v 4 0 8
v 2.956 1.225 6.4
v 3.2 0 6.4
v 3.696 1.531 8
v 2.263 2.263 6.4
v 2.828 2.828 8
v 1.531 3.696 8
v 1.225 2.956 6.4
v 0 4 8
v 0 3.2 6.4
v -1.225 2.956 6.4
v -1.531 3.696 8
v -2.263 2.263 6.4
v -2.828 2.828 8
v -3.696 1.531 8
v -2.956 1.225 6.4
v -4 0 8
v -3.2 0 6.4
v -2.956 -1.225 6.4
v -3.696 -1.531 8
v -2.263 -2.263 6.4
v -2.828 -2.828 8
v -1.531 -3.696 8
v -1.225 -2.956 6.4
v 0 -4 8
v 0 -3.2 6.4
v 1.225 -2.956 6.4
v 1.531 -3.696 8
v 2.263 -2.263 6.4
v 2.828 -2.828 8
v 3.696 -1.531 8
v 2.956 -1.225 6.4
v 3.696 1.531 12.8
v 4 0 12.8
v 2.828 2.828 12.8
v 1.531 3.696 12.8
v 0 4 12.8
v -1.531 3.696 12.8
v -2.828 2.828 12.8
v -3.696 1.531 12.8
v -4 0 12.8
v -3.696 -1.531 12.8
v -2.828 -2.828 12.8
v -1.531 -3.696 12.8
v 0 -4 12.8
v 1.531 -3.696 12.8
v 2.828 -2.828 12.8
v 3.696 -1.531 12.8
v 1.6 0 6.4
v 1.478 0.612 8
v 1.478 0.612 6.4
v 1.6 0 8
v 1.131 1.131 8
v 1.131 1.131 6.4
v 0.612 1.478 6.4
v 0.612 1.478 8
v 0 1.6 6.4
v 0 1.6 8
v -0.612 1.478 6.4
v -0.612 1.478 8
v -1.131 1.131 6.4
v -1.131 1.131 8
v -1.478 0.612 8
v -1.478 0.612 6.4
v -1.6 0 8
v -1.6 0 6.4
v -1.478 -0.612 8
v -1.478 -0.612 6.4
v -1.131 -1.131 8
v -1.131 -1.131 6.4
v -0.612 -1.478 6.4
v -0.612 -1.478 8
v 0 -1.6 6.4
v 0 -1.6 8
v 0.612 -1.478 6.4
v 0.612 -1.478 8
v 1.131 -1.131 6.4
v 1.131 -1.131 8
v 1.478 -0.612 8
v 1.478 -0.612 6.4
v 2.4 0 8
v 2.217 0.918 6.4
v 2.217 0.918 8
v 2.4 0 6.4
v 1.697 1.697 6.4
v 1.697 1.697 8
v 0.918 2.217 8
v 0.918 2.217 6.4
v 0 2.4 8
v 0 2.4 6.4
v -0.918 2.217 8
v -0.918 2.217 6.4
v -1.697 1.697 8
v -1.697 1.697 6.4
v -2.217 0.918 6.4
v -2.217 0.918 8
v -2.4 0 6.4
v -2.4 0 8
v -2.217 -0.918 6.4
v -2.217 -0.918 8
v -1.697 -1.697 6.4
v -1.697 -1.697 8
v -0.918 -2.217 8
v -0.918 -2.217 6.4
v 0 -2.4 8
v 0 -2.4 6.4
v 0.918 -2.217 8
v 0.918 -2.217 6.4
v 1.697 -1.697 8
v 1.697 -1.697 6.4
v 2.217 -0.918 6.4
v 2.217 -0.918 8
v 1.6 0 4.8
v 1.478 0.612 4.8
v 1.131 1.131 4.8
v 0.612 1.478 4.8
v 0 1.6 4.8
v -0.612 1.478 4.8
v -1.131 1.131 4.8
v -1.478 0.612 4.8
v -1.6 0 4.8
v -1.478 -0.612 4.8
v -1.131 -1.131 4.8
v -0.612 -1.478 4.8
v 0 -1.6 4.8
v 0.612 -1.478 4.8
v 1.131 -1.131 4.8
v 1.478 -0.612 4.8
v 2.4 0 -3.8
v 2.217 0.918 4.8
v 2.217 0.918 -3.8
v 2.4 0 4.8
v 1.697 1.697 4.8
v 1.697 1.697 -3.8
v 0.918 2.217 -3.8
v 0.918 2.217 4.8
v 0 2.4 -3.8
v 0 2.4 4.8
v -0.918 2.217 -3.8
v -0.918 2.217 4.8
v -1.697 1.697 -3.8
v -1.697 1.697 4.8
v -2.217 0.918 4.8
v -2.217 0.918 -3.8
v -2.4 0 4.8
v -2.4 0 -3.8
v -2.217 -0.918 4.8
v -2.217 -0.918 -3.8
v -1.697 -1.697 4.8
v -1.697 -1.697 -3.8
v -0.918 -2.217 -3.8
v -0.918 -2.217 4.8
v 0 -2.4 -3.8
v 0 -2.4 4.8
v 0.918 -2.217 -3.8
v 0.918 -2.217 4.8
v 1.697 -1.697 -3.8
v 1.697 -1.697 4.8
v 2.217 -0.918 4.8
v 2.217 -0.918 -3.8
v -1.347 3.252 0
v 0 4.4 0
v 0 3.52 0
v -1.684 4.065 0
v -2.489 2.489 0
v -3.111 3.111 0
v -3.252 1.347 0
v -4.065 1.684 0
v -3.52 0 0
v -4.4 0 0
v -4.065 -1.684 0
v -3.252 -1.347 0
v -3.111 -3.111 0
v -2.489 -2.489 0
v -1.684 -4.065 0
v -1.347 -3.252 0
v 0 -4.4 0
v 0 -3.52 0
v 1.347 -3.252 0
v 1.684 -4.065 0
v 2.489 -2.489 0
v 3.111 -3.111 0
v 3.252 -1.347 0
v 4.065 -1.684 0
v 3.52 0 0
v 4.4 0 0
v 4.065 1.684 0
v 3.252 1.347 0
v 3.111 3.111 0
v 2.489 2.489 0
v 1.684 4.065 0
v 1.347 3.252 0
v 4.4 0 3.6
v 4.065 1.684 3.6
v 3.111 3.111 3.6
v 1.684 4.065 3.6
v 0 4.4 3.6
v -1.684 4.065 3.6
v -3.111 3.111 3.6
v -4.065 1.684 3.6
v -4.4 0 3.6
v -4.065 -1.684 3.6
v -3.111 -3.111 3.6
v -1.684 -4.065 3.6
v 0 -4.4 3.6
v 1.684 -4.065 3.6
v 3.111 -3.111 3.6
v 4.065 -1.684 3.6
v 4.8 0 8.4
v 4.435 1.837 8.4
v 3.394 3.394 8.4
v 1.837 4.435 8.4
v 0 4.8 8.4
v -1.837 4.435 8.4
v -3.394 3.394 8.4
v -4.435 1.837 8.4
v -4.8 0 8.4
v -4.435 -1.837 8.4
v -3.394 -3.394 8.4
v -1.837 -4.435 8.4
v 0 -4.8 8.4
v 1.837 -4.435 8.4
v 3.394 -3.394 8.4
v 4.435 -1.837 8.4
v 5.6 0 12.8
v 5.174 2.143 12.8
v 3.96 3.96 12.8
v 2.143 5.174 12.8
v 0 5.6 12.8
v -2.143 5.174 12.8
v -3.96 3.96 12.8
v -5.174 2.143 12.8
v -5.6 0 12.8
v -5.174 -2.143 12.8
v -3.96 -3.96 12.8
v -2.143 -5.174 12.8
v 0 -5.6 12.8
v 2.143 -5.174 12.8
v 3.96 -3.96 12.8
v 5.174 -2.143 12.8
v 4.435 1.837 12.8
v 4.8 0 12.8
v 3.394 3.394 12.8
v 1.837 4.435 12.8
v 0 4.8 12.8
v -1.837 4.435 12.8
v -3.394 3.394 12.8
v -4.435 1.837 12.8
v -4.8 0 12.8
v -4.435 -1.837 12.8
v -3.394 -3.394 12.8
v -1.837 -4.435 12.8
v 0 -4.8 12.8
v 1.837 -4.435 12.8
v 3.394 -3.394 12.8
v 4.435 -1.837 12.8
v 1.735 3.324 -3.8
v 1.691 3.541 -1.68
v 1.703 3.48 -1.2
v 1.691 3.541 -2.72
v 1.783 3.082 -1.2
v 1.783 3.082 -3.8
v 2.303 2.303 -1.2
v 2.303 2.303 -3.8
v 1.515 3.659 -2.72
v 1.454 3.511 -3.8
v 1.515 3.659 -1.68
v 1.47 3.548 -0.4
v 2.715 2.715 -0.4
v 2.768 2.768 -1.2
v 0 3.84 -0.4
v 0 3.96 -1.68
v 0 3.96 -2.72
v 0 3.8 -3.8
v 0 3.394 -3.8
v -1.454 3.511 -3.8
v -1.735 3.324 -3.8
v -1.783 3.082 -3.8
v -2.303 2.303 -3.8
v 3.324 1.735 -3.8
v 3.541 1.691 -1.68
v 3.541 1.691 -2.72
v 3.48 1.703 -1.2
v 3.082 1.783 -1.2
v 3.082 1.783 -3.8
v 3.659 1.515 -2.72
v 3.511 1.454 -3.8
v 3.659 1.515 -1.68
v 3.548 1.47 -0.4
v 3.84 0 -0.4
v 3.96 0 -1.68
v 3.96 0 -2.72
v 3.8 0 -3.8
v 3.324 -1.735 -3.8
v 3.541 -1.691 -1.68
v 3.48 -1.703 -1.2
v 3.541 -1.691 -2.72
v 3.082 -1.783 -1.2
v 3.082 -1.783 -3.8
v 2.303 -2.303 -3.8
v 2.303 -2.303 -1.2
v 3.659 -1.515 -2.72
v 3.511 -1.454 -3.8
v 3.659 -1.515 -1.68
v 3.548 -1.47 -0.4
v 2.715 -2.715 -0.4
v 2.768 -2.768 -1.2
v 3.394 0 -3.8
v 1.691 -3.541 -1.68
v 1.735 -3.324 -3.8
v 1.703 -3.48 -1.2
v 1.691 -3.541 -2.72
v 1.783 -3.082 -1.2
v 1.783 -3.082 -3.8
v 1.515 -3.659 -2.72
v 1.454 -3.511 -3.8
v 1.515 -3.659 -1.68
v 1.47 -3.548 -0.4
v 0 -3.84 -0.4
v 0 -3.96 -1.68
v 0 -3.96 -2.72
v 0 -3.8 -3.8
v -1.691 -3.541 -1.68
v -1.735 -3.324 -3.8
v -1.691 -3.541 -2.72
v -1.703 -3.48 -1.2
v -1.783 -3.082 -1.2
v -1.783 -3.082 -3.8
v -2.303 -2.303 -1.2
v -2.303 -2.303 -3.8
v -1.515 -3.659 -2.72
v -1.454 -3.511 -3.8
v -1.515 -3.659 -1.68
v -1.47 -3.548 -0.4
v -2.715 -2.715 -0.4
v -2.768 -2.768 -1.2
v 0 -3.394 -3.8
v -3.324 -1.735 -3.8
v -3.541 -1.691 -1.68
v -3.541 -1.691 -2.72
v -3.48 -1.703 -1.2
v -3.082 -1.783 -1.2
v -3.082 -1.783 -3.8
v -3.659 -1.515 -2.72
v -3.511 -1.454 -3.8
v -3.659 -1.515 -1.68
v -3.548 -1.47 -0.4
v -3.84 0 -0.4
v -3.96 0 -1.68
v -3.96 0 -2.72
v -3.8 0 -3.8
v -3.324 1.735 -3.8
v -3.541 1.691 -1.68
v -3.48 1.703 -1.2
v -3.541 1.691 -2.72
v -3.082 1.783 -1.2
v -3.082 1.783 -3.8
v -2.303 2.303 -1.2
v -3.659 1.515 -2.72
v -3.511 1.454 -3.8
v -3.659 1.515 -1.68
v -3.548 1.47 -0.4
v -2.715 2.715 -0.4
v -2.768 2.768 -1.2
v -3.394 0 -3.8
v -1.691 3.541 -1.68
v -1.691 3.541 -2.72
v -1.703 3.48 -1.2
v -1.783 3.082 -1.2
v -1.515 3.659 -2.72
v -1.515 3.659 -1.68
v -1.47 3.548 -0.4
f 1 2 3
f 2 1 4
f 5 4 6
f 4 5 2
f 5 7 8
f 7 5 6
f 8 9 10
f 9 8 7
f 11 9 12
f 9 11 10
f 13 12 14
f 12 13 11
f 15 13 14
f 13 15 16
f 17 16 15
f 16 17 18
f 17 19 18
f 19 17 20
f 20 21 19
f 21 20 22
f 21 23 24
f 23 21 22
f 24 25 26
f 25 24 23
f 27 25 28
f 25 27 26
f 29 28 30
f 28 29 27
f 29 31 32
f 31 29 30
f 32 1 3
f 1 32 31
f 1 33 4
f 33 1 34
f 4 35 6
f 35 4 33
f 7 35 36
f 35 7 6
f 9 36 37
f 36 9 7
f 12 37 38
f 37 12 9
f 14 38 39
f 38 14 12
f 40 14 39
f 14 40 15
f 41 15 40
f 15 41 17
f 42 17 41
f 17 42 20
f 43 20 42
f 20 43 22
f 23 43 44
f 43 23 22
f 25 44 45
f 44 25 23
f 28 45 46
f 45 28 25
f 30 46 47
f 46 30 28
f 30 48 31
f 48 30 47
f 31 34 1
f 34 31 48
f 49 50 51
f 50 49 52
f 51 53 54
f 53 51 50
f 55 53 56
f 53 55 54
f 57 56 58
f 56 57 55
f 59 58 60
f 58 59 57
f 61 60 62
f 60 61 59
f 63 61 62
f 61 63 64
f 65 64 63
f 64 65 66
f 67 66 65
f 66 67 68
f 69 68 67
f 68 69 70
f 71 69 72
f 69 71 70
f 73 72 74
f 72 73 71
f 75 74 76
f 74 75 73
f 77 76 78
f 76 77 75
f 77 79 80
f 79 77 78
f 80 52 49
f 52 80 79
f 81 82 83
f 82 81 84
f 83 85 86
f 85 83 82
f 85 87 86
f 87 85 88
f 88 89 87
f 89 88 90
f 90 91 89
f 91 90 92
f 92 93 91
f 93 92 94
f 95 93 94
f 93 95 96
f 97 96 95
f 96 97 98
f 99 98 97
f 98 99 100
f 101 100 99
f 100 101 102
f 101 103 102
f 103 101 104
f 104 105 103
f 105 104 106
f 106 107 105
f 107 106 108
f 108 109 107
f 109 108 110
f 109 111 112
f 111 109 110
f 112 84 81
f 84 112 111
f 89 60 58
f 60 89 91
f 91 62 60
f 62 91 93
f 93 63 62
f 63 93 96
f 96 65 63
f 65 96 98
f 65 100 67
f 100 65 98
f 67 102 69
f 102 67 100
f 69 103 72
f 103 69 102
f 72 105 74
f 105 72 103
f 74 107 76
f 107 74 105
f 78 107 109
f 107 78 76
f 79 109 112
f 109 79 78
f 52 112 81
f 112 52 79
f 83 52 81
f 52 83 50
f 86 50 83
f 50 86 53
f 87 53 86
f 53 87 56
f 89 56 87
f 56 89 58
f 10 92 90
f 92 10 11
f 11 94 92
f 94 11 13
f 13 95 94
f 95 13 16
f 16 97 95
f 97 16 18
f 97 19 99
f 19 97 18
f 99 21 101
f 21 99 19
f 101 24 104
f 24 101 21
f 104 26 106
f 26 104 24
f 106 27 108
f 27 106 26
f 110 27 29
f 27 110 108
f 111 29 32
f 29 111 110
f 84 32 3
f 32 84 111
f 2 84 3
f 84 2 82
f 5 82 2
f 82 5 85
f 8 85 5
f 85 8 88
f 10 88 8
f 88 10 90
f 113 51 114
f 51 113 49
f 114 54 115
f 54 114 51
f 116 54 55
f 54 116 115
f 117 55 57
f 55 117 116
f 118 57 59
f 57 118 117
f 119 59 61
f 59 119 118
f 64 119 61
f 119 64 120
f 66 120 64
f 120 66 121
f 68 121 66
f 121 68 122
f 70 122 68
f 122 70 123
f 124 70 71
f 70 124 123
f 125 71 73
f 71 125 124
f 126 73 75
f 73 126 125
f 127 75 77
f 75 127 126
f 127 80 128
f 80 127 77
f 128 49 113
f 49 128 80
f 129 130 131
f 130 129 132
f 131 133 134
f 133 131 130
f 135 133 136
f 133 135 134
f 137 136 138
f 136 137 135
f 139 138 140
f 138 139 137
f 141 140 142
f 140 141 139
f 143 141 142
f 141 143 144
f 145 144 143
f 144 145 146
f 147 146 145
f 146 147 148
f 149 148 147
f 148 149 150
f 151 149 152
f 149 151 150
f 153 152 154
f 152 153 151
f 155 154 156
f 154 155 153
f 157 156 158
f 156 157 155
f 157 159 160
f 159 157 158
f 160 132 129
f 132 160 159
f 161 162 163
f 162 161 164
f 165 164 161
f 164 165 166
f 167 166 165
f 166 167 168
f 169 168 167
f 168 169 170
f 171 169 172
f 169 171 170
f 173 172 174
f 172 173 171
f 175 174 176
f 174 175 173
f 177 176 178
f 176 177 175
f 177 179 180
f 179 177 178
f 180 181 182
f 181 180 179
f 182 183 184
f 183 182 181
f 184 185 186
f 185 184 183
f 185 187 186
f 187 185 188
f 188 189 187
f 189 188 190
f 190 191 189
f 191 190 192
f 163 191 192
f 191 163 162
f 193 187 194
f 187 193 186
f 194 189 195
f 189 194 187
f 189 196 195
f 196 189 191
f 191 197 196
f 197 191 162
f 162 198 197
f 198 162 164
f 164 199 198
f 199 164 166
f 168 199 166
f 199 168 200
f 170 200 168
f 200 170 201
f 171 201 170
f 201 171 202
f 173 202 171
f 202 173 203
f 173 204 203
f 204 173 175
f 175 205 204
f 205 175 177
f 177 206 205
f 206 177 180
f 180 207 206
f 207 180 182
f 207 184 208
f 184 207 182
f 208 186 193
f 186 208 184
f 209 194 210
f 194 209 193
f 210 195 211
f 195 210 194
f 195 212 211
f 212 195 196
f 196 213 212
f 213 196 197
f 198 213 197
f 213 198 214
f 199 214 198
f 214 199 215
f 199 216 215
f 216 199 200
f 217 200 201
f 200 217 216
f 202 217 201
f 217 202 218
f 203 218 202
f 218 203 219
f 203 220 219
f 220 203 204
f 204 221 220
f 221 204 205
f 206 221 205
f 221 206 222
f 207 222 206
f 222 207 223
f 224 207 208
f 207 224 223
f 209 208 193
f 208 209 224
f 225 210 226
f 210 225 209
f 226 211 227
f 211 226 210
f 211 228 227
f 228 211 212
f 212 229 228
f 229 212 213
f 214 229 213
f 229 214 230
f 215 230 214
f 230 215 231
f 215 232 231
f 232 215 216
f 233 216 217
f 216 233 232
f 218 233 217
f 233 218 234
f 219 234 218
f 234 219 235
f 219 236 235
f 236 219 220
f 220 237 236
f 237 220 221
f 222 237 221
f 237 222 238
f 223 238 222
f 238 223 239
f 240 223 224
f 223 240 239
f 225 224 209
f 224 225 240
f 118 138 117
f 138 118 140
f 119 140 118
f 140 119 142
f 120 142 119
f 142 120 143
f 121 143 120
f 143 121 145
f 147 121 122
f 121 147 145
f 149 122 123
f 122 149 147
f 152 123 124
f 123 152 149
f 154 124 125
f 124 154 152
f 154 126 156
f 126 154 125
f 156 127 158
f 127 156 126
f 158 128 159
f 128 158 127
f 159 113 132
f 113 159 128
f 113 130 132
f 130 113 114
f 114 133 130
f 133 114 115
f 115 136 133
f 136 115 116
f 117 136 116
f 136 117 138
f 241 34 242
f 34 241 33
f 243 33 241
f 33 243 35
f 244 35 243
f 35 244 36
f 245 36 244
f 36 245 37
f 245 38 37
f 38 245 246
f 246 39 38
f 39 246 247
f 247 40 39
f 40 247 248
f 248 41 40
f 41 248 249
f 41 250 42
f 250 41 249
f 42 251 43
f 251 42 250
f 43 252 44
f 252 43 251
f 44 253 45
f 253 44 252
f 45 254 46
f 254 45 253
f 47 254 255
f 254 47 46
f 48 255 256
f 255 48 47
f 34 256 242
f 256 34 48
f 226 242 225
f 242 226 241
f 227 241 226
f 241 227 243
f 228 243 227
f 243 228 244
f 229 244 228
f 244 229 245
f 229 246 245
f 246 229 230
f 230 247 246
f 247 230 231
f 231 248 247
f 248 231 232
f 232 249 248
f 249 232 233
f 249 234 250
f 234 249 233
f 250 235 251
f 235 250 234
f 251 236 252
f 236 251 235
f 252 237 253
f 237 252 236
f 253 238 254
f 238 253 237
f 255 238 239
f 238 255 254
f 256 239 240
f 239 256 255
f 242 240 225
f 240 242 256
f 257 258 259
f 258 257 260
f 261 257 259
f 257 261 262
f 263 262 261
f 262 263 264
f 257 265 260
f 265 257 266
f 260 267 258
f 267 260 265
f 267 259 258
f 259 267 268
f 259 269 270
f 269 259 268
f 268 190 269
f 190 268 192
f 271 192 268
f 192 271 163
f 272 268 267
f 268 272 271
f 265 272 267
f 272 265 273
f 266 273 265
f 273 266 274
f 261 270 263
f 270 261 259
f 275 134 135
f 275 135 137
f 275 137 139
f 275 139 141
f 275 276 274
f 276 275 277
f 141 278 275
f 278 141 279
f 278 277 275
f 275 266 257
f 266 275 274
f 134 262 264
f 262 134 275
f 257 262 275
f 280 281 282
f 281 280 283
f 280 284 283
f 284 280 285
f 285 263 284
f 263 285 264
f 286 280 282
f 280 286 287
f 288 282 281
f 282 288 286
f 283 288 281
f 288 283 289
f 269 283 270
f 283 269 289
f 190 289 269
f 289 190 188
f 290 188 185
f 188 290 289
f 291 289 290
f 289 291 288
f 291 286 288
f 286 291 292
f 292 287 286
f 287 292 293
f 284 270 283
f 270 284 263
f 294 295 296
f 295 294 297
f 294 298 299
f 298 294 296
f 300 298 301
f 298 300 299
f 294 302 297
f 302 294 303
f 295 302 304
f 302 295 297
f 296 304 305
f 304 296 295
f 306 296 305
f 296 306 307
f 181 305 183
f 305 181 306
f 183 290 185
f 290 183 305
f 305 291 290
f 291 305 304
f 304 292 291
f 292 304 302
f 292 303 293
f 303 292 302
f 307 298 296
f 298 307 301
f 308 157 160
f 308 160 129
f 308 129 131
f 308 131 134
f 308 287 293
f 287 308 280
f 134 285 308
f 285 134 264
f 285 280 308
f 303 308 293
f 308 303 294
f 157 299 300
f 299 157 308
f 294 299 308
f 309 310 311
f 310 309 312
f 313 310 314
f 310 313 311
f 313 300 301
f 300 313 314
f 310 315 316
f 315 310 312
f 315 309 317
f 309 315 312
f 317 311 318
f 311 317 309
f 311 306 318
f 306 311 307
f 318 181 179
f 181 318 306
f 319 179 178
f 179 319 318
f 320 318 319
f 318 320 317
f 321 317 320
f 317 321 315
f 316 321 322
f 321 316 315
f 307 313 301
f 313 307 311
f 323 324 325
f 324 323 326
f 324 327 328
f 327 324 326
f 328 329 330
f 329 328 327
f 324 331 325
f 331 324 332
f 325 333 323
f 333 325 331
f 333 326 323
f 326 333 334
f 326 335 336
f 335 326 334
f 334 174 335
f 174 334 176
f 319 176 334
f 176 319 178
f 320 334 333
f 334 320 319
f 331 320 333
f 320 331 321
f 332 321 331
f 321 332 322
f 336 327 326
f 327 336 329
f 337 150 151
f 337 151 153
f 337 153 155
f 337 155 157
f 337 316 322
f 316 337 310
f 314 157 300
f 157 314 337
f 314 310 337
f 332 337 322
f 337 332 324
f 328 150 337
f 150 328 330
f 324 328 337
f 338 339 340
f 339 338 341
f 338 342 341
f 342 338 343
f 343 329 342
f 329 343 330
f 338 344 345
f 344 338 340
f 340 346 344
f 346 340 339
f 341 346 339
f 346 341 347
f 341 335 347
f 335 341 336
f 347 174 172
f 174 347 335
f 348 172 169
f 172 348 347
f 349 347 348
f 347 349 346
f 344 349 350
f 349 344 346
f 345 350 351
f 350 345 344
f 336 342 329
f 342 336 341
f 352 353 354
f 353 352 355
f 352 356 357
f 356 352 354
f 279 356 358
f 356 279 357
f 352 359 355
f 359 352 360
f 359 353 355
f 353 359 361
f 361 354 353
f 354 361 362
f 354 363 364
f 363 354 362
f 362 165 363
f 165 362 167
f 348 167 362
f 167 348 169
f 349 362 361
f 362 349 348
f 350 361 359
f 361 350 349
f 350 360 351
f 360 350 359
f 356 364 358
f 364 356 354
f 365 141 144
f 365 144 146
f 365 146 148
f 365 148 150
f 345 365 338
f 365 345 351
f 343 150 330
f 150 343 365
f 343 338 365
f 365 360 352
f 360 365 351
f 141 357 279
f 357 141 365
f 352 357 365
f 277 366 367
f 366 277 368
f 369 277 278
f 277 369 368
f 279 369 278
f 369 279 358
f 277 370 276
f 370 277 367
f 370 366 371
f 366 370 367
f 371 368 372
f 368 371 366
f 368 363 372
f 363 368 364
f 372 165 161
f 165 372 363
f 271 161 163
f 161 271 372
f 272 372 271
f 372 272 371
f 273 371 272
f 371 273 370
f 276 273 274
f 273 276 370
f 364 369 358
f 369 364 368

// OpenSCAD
use <../lib.scad>
use <../p/4-4con11.scad>
use <../p/4-4con4.scad>
use <../p/4-4con6.scad>
use <../p/4-4cyli.scad>
use <../p/4-4cylo.scad>
use <../p/4-4edge.scad>
use <../p/4-4ring2.scad>
use <../p/4-4ring3.scad>
use <../p/4-4ring4.scad>
use <../p/4-4ring5.scad>
use <../p/4-4ring6.scad>
use <s/2536as01.scad>
use <../p/stud2a.scad>
function ldraw_lib__2536a() = [
// 0 Plant Tree Palm Trunk with Long Indented Connector
// 0 Name: 2536a.dat
// 0 Author: Philippe Hurbain [Philo]
// 0 !LDRAW_ORG Part UPDATE 2022-01
// 0 !LICENSE Licensed under CC BY 4.0 : see CAreadme.txt
// 
// 0 BFC CERTIFY CCW
  [0,"BFC","CERTIFY"],
  [0,"BFC","CCW"],
// 
// 0 !HISTORY 2022-01-14 [PTadmin] Official Update 2022-01
// 
// 
// 0 BFC INVERTNEXT
  [0,"BFC","INVERTNEXT"],
// 1 16 0 -20 0 2 0 0 0 4 0 0 0 2 4-4con4.dat
  [1,16,0,-20,0,2,0,0,0,4,0,0,0,2, ldraw_lib__4_4con4()],
// 0 BFC INVERTNEXT
  [0,"BFC","INVERTNEXT"],
// 1 16 0 -32 0 10 0 0 0 12 0 0 0 10 4-4cylo.dat
  [1,16,0,-32,0,10,0,0,0,12,0,0,0,10, ldraw_lib__4_4cylo()],
// 1 16 0 -16 0 1 0 0 0 1 0 0 0 1 stud2a.dat
  [1,16,0,-16,0,1,0,0,0,1,0,0,0,1, ldraw_lib__stud2a()],
// 1 16 0 -16 0 6 0 0 0 1 0 0 0 6 4-4edge.dat
  [1,16,0,-16,0,6,0,0,0,1,0,0,0,6, ldraw_lib__4_4edge()],
// 1 16 0 -16 0 8 0 0 0 1 0 0 0 8 4-4edge.dat
  [1,16,0,-16,0,8,0,0,0,1,0,0,0,8, ldraw_lib__4_4edge()],
// 1 16 0 -16 0 2 0 0 0 1 0 0 0 2 4-4ring3.dat
  [1,16,0,-16,0,2,0,0,0,1,0,0,0,2, ldraw_lib__4_4ring3()],
// 0 BFC INVERTNEXT
  [0,"BFC","INVERTNEXT"],
// 1 16 0 -12 0 4 0 0 0 -4 0 0 0 4 4-4cyli.dat
  [1,16,0,-12,0,4,0,0,0,-4,0,0,0,4, ldraw_lib__4_4cyli()],
// 0 BFC INVERTNEXT
  [0,"BFC","INVERTNEXT"],
// 1 16 0 -12 0 6 0 0 0 21.5 0 0 0 6 4-4cylo.dat
  [1,16,0,-12,0,6,0,0,0,21.5,0,0,0,6, ldraw_lib__4_4cylo()],
// 1 16 0 0 0 11 0 0 0 1 0 0 0 11 4-4edge.dat
  [1,16,0,0,0,11,0,0,0,1,0,0,0,11, ldraw_lib__4_4edge()],
// 1 16 0 0 0 2.2 0 0 0 -1 0 0 0 2.2 4-4ring4.dat
  [1,16,0,0,0,2.2,0,0,0,-1,0,0,0,2.2, ldraw_lib__4_4ring4()],
// 1 16 0 0 0 8.8 0 0 0 1 0 0 0 8.8 4-4edge.dat
  [1,16,0,0,0,8.8,0,0,0,1,0,0,0,8.8, ldraw_lib__4_4edge()],
// 1 16 0 -9 0 11 0 0 0 9 0 0 0 11 4-4cyli.dat
  [1,16,0,-9,0,11,0,0,0,9,0,0,0,11, ldraw_lib__4_4cyli()],
// 1 16 0 -21 0 1 0 0 0 12 0 0 0 1 4-4con11.dat
  [1,16,0,-21,0,1,0,0,0,12,0,0,0,1, ldraw_lib__4_4con11()],
// 1 16 0 -32 0 2 0 0 0 11 0 0 0 2 4-4con6.dat
  [1,16,0,-32,0,2,0,0,0,11,0,0,0,2, ldraw_lib__4_4con6()],
// 1 16 0 -12 0 4 0 0 0 1 0 0 0 4 4-4edge.dat
  [1,16,0,-12,0,4,0,0,0,1,0,0,0,4, ldraw_lib__4_4edge()],
// 1 16 0 -12 0 2 0 0 0 -1 0 0 0 2 4-4ring2.dat
  [1,16,0,-12,0,2,0,0,0,-1,0,0,0,2, ldraw_lib__4_4ring2()],
// 1 16 0 -32 0 14 0 0 0 1 0 0 0 14 4-4edge.dat
  [1,16,0,-32,0,14,0,0,0,1,0,0,0,14, ldraw_lib__4_4edge()],
// 1 16 0 -32 0 2 0 0 0 1 0 0 0 2 4-4ring5.dat
  [1,16,0,-32,0,2,0,0,0,1,0,0,0,2, ldraw_lib__4_4ring5()],
// 1 16 0 -32 0 2 0 0 0 1 0 0 0 2 4-4ring6.dat
  [1,16,0,-32,0,2,0,0,0,1,0,0,0,2, ldraw_lib__4_4ring6()],
// 1 16 0 0 0 1 0 0 0 1 0 0 0 1 s\2536as01.dat
  [1,16,0,0,0,1,0,0,0,1,0,0,0,1, ldraw_lib__s__2536as01()],
// 1 16 0 0 0 0 0 1 0 1 0 -1 0 0 s\2536as01.dat
  [1,16,0,0,0,0,0,1,0,1,0,-1,0,0, ldraw_lib__s__2536as01()],
// 1 16 0 0 0 -1 0 0 0 1 0 0 0 -1 s\2536as01.dat
  [1,16,0,0,0,-1,0,0,0,1,0,0,0,-1, ldraw_lib__s__2536as01()],
// 1 16 0 0 0 0 0 -1 0 1 0 1 0 0 s\2536as01.dat
  [1,16,0,0,0,0,0,-1,0,1,0,1,0,0, ldraw_lib__s__2536as01()],
];
module ldraw_lib__2536a(step=0, col=false, unit=2/5, alt=false, line=0.2, solid=!$preview)
    makepoly(ldraw_lib__2536a(), step=step, col=col, unit=unit, alt=alt, line=line, solid=solid);
ldraw_lib__2536a(line=0.2);
